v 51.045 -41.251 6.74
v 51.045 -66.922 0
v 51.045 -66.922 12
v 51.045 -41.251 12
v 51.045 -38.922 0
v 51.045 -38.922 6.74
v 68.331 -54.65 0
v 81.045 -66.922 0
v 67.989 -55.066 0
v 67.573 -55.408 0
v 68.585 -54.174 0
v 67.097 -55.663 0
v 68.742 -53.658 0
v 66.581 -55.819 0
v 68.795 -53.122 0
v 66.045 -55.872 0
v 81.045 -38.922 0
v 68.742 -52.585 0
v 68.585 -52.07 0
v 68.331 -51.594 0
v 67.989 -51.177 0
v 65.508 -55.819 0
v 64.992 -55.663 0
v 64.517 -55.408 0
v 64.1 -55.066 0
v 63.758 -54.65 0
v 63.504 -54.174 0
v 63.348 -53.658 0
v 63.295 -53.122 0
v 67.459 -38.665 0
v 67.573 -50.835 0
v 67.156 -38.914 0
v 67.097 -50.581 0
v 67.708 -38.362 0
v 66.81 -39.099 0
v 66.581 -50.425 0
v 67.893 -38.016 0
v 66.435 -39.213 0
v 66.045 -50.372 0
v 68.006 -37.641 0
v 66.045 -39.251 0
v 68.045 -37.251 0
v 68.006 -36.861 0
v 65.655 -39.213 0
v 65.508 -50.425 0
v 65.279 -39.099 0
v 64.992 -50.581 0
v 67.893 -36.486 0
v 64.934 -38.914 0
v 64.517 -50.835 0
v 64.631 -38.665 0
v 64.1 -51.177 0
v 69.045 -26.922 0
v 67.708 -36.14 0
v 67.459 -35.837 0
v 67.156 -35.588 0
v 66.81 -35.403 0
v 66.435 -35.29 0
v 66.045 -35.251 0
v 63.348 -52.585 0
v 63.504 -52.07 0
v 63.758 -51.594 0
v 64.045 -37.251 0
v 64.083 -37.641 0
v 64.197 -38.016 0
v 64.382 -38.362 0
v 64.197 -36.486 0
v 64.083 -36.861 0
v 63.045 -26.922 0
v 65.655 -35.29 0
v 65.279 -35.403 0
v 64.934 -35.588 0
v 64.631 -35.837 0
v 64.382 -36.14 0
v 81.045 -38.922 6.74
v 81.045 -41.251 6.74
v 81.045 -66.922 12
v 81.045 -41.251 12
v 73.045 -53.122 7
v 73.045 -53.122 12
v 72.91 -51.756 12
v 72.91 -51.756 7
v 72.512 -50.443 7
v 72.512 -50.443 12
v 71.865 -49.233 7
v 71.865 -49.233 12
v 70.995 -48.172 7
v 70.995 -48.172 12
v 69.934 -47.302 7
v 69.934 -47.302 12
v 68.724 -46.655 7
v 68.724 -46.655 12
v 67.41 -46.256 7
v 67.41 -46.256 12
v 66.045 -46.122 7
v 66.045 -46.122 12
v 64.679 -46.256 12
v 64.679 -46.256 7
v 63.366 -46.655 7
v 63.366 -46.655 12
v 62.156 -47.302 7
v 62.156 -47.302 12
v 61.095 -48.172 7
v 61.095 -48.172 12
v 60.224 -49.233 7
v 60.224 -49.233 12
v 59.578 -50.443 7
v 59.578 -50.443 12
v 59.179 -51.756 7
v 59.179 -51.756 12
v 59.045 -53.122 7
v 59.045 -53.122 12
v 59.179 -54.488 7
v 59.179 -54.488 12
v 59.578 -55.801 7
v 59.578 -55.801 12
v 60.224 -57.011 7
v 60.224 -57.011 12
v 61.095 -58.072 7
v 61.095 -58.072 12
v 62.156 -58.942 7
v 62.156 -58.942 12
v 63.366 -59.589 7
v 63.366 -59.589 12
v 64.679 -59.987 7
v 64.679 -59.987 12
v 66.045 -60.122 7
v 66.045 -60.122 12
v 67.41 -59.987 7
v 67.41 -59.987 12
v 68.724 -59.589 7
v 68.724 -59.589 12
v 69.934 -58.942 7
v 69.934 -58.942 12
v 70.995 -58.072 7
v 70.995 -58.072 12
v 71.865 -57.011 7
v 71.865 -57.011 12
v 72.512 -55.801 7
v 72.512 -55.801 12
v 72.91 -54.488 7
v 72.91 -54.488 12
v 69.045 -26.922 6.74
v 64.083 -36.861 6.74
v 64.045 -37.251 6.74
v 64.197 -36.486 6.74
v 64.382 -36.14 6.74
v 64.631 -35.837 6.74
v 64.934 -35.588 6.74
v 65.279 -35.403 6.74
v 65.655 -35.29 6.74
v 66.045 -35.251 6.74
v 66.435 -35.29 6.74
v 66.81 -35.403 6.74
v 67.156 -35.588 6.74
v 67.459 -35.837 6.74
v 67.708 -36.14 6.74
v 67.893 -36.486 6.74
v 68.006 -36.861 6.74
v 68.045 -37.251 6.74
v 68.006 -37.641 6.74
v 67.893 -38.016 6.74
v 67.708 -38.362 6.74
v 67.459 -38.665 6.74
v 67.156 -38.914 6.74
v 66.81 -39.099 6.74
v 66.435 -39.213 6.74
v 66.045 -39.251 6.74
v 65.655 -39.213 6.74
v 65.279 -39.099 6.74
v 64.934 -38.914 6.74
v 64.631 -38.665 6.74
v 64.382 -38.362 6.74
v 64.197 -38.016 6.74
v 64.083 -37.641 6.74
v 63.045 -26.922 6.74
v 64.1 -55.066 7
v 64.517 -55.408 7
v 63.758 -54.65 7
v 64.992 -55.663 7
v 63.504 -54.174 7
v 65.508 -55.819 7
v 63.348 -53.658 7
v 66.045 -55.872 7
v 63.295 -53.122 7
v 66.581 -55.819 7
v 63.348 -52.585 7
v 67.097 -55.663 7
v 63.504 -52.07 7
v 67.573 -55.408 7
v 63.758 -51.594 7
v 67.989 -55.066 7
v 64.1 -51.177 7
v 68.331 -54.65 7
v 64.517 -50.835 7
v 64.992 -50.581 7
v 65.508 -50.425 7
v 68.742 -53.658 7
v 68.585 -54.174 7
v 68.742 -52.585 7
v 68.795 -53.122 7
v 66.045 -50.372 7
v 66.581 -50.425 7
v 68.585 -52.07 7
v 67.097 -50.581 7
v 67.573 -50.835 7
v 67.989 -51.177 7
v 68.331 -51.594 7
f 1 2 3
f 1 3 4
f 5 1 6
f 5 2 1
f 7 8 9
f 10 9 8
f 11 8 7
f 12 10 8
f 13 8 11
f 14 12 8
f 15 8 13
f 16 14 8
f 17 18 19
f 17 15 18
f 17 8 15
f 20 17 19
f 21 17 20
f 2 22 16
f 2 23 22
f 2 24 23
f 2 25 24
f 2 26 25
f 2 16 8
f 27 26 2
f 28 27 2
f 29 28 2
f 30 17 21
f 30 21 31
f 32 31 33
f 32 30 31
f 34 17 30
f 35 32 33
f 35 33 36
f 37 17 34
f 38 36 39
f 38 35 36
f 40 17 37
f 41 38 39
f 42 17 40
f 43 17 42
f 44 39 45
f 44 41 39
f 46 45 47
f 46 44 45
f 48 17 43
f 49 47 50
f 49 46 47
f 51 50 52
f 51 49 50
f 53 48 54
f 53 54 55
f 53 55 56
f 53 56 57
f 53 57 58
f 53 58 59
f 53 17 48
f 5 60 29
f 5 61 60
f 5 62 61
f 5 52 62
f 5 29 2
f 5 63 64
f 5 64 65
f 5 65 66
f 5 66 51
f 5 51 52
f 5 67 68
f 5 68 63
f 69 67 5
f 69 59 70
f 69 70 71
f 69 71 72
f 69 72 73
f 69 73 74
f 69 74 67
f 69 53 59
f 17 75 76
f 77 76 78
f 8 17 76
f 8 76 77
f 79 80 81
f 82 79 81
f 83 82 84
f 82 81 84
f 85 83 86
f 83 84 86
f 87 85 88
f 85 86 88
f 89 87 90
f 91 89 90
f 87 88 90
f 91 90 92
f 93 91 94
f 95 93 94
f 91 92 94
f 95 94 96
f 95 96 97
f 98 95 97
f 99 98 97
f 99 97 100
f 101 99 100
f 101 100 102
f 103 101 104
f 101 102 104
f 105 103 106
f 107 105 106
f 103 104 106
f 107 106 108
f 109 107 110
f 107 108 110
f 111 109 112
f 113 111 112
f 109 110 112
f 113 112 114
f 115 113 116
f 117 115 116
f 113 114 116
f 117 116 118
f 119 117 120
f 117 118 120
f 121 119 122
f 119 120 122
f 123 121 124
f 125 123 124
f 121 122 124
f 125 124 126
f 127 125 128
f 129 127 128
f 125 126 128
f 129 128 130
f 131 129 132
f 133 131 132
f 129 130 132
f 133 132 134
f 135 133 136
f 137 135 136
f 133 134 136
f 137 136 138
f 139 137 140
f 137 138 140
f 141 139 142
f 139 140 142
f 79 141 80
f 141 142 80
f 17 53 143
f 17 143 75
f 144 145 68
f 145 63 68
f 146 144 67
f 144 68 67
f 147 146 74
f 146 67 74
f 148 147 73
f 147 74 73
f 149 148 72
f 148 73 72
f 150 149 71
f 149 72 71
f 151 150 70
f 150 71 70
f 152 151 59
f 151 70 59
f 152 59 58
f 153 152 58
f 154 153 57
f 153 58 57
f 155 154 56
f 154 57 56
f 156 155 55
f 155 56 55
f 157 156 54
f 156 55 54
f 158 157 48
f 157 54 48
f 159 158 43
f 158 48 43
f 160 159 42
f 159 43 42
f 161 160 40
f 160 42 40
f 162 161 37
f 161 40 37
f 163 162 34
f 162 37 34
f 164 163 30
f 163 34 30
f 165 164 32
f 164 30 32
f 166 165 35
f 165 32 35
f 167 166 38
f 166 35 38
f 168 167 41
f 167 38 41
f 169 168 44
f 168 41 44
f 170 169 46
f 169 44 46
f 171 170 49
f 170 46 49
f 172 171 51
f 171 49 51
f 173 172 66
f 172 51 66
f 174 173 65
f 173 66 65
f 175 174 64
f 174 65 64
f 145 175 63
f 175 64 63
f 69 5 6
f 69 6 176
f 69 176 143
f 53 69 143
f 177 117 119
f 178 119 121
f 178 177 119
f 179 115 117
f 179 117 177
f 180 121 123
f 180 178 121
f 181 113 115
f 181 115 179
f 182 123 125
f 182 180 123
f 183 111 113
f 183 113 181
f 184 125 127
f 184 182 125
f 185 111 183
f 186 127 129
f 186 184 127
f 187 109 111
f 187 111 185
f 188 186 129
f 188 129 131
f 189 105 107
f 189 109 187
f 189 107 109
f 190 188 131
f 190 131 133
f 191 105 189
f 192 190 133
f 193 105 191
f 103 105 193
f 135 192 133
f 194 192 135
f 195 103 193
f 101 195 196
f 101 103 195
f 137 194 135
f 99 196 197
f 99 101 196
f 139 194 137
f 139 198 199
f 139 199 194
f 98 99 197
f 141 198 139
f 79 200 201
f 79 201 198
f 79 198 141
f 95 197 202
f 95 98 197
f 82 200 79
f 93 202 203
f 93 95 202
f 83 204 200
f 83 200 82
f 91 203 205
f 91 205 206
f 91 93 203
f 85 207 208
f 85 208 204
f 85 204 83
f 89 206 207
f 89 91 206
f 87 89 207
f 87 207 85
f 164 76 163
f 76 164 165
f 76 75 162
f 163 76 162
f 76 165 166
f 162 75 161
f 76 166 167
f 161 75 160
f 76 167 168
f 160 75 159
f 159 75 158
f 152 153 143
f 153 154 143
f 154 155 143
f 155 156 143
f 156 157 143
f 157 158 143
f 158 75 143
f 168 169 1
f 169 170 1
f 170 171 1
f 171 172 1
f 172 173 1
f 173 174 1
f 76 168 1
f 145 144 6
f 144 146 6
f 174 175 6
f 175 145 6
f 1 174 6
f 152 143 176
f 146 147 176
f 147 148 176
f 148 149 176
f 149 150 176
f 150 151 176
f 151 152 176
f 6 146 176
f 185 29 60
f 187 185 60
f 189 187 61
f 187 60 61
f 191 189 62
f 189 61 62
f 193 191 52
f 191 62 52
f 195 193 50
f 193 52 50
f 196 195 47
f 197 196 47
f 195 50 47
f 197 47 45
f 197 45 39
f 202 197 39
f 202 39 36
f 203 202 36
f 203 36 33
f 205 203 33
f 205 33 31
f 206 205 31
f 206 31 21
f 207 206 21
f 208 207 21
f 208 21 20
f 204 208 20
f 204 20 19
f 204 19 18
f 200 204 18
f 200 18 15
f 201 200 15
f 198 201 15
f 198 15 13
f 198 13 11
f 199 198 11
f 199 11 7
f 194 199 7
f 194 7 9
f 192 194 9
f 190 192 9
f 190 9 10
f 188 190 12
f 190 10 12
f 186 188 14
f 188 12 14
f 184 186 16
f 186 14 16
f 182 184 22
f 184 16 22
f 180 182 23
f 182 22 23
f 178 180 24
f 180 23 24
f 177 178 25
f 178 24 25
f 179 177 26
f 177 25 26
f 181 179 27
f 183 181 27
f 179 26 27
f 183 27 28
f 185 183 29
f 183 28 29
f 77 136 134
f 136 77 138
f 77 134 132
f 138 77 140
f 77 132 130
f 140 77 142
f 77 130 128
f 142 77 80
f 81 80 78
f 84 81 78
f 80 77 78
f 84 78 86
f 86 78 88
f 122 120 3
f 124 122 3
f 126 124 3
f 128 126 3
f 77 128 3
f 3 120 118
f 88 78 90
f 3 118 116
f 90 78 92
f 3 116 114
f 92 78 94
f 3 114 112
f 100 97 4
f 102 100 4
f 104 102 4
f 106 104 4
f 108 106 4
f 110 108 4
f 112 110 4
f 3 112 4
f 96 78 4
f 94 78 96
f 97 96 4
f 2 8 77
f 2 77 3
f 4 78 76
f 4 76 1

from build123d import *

# Parameters (mm, degrees)
RESSALTO_EXTRUS_O1_DEPTH       = 12
FURO_COM_FOLGA_DE_M51_D        = 5.5
ESBO_O9_R                      = 7
CORTE_EXTRUS_O3_DEPTH          = 5
CORTE_EXTRUS_O4_DEPTH          = 5.26
FURO_DE_DI_METRO_4_0_4_1_D     = 4
FURO_DE_DI_METRO_4_0_4_1_DEPTH = 6.74
FURO_DE_DI_METRO_4_0_4_1_TIP   = 1.201721238


with BuildPart() as part:
    # Esboço1 → Ressalto-extrusão1 (new body)
    with BuildSketch(Plane.XY):
        Polygon((69.044771166, -26.921923077), (81.044771166, -38.921923077), (81.044771166, -66.921923077), (51.044771166, -66.921923077), (51.044771166, -38.921923077), (63.044771166, -26.921923077), align=None)
    extrude(amount=RESSALTO_EXTRUS_O1_DEPTH)

    # Furo com folga de M51 (through all)
    with Locations(Plane.XY.offset(12)):
        with Locations((66.044771166, -53.121923077)):
            Hole(FURO_COM_FOLGA_DE_M51_D / 2)

    # Esboço9 → Corte-extrusão3 (cut)
    with BuildSketch(Plane.XY.offset(12)):
        with Locations((66.044771166, -53.121923077)):
            Circle(ESBO_O9_R)
    extrude(amount=-CORTE_EXTRUS_O3_DEPTH, mode=Mode.SUBTRACT)

    # Esboço10 → Corte-extrusão4 (cut)
    with BuildSketch(Plane.XY.offset(12)):
        Polygon((51.044771166, -41.251110711), (51.044771166, -38.921923077), (63.044771166, -26.921923077), (69.044771166, -26.921923077), (81.044771166, -38.921923077), (81.044771166, -41.251110711), align=None)
    extrude(amount=-CORTE_EXTRUS_O4_DEPTH, mode=Mode.SUBTRACT)

    # Furo de diâmetro Ø4.0 (4)1
    with Locations(Plane.XY.offset(6.74)):
        with Locations((66.044771166, -37.251110711)):
            Hole(FURO_DE_DI_METRO_4_0_4_1_D / 2, depth=FURO_DE_DI_METRO_4_0_4_1_DEPTH)
            with Locations((0, 0, -(FURO_DE_DI_METRO_4_0_4_1_DEPTH + FURO_DE_DI_METRO_4_0_4_1_TIP / 2))):  # 118° drill point
                Cone(0, FURO_DE_DI_METRO_4_0_4_1_D / 2, FURO_DE_DI_METRO_4_0_4_1_TIP, mode=Mode.SUBTRACT)


solid = part.part
